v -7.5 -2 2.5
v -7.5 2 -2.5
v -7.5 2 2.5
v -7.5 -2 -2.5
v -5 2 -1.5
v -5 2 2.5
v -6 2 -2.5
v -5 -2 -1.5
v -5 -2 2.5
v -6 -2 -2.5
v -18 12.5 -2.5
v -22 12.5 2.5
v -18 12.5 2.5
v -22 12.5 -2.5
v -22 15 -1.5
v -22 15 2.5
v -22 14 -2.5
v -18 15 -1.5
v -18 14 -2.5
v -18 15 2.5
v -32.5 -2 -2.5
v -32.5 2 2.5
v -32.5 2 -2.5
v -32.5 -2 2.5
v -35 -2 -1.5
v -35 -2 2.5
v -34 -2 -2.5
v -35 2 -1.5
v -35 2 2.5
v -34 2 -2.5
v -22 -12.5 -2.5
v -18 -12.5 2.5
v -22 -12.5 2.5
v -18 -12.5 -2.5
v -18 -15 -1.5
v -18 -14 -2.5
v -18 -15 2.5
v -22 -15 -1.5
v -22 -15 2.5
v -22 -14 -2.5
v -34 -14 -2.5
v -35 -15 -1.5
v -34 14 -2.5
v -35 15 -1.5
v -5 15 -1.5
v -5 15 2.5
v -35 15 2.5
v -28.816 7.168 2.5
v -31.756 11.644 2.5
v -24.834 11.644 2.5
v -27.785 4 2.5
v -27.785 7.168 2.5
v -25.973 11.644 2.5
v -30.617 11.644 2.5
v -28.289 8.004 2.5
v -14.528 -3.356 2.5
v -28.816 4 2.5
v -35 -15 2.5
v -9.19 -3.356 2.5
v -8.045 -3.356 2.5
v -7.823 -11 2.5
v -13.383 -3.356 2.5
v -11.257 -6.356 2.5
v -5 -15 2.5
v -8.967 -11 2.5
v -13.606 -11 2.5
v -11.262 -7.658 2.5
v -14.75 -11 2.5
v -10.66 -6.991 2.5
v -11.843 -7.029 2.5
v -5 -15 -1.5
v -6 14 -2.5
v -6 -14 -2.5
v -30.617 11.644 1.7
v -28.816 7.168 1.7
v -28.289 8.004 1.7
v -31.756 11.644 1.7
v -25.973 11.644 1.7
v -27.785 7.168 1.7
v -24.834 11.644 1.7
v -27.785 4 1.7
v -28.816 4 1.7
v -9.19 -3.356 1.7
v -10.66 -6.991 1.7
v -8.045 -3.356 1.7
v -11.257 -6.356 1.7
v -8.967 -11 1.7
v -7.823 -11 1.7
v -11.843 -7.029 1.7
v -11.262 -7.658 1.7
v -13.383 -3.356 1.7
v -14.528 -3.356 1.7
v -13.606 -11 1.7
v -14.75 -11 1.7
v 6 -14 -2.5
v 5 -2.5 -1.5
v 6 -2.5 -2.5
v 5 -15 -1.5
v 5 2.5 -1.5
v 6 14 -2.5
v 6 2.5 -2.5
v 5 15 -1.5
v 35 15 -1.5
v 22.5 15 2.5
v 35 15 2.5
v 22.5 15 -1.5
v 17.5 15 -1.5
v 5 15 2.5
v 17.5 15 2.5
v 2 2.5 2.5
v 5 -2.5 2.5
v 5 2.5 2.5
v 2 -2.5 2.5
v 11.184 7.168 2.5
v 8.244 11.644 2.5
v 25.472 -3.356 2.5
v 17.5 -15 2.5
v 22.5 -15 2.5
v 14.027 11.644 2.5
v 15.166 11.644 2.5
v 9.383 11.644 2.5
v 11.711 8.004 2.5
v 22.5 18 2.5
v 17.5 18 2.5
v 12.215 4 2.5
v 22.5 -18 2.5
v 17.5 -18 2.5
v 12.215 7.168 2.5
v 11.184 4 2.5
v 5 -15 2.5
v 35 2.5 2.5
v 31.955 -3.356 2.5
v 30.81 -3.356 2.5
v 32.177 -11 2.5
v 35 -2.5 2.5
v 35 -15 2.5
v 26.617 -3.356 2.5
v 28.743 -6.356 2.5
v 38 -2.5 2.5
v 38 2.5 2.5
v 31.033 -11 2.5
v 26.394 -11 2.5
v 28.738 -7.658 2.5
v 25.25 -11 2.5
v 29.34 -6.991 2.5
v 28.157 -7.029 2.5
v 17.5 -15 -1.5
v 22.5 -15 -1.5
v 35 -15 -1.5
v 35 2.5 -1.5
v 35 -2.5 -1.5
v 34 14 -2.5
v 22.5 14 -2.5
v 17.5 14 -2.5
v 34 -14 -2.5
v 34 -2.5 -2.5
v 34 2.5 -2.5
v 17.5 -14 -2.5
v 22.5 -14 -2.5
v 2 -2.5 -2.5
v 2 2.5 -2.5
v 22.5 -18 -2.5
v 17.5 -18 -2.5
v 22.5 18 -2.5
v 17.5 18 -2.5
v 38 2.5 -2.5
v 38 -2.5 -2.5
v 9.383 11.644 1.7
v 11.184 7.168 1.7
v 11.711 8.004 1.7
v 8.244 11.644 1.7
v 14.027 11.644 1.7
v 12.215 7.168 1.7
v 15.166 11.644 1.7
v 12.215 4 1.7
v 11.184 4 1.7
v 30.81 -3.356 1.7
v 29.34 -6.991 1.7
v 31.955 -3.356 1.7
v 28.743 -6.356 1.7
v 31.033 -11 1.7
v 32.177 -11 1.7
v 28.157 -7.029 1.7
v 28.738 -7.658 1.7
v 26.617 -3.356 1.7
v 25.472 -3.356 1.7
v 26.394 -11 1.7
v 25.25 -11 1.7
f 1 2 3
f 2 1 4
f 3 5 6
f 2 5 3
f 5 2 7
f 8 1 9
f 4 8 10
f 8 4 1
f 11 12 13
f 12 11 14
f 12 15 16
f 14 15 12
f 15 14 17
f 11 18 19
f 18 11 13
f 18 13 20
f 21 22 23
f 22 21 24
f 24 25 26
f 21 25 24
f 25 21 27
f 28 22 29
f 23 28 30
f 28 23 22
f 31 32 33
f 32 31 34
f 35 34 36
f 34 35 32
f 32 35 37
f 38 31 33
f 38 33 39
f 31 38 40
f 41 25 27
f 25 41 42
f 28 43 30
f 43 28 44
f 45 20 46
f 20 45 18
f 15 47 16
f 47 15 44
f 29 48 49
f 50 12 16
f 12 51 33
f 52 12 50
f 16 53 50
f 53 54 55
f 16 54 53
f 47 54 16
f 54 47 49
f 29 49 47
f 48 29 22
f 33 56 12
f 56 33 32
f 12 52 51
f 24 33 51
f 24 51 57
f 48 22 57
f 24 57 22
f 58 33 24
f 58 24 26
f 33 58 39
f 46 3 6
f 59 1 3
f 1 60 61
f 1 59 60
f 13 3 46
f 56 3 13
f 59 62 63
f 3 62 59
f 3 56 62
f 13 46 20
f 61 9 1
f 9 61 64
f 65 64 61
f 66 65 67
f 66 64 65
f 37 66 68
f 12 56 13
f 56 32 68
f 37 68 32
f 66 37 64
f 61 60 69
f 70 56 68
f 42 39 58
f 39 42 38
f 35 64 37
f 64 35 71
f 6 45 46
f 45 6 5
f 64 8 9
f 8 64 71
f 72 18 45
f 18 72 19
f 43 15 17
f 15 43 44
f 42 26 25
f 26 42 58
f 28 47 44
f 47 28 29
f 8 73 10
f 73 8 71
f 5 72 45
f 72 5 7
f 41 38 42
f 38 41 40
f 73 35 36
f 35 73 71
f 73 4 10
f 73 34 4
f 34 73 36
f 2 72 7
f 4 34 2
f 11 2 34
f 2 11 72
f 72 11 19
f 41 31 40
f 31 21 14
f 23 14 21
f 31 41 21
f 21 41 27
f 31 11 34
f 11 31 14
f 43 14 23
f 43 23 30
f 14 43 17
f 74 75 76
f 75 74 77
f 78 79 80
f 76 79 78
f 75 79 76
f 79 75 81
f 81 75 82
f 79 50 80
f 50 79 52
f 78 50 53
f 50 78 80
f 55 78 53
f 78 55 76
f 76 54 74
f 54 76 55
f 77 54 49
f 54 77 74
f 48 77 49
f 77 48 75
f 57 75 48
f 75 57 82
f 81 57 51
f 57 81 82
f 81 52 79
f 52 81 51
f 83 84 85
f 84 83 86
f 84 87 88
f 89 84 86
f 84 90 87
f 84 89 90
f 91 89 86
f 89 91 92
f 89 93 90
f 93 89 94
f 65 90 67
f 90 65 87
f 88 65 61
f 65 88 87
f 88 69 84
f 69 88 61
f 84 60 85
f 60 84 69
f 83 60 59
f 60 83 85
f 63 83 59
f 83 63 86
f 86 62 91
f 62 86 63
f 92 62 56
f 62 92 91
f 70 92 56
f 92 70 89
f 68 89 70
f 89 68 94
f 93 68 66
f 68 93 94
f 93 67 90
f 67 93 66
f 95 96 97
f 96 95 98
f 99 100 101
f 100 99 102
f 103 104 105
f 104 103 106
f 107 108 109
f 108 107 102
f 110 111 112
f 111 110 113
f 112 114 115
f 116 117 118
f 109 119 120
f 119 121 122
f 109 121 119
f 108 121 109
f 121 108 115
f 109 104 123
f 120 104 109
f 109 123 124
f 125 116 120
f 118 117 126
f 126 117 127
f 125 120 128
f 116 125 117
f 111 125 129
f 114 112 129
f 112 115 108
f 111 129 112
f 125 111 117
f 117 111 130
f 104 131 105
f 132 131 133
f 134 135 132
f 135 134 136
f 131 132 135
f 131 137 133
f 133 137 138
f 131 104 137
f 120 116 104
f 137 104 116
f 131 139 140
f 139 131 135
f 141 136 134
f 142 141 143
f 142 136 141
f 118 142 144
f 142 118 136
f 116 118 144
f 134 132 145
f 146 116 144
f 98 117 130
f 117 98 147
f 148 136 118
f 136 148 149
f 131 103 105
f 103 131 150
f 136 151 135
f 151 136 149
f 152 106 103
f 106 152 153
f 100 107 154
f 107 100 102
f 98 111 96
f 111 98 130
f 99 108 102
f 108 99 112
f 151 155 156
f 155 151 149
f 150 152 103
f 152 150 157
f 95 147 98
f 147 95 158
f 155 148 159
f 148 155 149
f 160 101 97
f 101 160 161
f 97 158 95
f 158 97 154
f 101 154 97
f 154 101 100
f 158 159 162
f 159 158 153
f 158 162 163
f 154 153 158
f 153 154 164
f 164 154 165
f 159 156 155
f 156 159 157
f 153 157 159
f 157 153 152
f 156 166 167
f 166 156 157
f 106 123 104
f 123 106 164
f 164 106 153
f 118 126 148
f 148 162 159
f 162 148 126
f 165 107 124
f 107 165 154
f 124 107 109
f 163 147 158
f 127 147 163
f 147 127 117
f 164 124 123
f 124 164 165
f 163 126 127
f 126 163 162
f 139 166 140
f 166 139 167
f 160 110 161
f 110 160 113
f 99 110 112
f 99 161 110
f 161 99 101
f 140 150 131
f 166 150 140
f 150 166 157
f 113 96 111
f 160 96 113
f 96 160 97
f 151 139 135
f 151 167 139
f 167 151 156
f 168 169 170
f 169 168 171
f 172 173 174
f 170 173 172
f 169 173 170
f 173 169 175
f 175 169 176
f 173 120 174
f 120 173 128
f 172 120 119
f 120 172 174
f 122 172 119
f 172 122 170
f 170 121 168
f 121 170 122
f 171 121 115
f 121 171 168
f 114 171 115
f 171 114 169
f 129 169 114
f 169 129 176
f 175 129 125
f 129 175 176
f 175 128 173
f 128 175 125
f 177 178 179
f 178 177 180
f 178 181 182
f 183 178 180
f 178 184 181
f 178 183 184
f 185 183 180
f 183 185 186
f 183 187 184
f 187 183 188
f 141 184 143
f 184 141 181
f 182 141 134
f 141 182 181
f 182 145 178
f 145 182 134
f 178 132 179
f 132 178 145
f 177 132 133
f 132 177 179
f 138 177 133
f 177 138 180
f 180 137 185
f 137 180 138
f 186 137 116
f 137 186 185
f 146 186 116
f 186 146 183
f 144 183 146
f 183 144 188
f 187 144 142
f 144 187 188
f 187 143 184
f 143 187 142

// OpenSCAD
translate([-20,0,0])
pro_backlash();

translate([20,0,0])
anti_backlash();

//pro_backlash();
//anti_backlash();

module pro_backlash() {
    difference() {
        hull() {
            cube([28,28,5],center=true);

            translate([0,0,(5-4)/2])
            cube([30,30,4],center=true);
        }

        for(i=[0:3]) {
            rotate([0,0,i*90])
            translate([30/2,0,0])
            cube([5,4,10],center=true);
        }

        translate([-12,4,-5/2+4.2])
        linear_extrude(1)
        text("Y", size=8);

        translate([5,-30/2+4,-5/2+4.2])
        linear_extrude(1)
        text("X", size=8);
    }
}

module anti_backlash() {

    difference() {
        union() {
            hull() {
                cube([28,28,5],center=true);

                translate([0,0,(5-4)/2])
                cube([30,30,4],center=true);
            }
            cube([5,36,5],center=true);
            cube([36,5,5],center=true);
        }

        translate([-12,4,-5/2+4.2])
        linear_extrude(1)
        text("Y", size=8);

        translate([5,-30/2+4,-5/2+4.2])
        linear_extrude(1)
        text("X", size=8);
    }
}
